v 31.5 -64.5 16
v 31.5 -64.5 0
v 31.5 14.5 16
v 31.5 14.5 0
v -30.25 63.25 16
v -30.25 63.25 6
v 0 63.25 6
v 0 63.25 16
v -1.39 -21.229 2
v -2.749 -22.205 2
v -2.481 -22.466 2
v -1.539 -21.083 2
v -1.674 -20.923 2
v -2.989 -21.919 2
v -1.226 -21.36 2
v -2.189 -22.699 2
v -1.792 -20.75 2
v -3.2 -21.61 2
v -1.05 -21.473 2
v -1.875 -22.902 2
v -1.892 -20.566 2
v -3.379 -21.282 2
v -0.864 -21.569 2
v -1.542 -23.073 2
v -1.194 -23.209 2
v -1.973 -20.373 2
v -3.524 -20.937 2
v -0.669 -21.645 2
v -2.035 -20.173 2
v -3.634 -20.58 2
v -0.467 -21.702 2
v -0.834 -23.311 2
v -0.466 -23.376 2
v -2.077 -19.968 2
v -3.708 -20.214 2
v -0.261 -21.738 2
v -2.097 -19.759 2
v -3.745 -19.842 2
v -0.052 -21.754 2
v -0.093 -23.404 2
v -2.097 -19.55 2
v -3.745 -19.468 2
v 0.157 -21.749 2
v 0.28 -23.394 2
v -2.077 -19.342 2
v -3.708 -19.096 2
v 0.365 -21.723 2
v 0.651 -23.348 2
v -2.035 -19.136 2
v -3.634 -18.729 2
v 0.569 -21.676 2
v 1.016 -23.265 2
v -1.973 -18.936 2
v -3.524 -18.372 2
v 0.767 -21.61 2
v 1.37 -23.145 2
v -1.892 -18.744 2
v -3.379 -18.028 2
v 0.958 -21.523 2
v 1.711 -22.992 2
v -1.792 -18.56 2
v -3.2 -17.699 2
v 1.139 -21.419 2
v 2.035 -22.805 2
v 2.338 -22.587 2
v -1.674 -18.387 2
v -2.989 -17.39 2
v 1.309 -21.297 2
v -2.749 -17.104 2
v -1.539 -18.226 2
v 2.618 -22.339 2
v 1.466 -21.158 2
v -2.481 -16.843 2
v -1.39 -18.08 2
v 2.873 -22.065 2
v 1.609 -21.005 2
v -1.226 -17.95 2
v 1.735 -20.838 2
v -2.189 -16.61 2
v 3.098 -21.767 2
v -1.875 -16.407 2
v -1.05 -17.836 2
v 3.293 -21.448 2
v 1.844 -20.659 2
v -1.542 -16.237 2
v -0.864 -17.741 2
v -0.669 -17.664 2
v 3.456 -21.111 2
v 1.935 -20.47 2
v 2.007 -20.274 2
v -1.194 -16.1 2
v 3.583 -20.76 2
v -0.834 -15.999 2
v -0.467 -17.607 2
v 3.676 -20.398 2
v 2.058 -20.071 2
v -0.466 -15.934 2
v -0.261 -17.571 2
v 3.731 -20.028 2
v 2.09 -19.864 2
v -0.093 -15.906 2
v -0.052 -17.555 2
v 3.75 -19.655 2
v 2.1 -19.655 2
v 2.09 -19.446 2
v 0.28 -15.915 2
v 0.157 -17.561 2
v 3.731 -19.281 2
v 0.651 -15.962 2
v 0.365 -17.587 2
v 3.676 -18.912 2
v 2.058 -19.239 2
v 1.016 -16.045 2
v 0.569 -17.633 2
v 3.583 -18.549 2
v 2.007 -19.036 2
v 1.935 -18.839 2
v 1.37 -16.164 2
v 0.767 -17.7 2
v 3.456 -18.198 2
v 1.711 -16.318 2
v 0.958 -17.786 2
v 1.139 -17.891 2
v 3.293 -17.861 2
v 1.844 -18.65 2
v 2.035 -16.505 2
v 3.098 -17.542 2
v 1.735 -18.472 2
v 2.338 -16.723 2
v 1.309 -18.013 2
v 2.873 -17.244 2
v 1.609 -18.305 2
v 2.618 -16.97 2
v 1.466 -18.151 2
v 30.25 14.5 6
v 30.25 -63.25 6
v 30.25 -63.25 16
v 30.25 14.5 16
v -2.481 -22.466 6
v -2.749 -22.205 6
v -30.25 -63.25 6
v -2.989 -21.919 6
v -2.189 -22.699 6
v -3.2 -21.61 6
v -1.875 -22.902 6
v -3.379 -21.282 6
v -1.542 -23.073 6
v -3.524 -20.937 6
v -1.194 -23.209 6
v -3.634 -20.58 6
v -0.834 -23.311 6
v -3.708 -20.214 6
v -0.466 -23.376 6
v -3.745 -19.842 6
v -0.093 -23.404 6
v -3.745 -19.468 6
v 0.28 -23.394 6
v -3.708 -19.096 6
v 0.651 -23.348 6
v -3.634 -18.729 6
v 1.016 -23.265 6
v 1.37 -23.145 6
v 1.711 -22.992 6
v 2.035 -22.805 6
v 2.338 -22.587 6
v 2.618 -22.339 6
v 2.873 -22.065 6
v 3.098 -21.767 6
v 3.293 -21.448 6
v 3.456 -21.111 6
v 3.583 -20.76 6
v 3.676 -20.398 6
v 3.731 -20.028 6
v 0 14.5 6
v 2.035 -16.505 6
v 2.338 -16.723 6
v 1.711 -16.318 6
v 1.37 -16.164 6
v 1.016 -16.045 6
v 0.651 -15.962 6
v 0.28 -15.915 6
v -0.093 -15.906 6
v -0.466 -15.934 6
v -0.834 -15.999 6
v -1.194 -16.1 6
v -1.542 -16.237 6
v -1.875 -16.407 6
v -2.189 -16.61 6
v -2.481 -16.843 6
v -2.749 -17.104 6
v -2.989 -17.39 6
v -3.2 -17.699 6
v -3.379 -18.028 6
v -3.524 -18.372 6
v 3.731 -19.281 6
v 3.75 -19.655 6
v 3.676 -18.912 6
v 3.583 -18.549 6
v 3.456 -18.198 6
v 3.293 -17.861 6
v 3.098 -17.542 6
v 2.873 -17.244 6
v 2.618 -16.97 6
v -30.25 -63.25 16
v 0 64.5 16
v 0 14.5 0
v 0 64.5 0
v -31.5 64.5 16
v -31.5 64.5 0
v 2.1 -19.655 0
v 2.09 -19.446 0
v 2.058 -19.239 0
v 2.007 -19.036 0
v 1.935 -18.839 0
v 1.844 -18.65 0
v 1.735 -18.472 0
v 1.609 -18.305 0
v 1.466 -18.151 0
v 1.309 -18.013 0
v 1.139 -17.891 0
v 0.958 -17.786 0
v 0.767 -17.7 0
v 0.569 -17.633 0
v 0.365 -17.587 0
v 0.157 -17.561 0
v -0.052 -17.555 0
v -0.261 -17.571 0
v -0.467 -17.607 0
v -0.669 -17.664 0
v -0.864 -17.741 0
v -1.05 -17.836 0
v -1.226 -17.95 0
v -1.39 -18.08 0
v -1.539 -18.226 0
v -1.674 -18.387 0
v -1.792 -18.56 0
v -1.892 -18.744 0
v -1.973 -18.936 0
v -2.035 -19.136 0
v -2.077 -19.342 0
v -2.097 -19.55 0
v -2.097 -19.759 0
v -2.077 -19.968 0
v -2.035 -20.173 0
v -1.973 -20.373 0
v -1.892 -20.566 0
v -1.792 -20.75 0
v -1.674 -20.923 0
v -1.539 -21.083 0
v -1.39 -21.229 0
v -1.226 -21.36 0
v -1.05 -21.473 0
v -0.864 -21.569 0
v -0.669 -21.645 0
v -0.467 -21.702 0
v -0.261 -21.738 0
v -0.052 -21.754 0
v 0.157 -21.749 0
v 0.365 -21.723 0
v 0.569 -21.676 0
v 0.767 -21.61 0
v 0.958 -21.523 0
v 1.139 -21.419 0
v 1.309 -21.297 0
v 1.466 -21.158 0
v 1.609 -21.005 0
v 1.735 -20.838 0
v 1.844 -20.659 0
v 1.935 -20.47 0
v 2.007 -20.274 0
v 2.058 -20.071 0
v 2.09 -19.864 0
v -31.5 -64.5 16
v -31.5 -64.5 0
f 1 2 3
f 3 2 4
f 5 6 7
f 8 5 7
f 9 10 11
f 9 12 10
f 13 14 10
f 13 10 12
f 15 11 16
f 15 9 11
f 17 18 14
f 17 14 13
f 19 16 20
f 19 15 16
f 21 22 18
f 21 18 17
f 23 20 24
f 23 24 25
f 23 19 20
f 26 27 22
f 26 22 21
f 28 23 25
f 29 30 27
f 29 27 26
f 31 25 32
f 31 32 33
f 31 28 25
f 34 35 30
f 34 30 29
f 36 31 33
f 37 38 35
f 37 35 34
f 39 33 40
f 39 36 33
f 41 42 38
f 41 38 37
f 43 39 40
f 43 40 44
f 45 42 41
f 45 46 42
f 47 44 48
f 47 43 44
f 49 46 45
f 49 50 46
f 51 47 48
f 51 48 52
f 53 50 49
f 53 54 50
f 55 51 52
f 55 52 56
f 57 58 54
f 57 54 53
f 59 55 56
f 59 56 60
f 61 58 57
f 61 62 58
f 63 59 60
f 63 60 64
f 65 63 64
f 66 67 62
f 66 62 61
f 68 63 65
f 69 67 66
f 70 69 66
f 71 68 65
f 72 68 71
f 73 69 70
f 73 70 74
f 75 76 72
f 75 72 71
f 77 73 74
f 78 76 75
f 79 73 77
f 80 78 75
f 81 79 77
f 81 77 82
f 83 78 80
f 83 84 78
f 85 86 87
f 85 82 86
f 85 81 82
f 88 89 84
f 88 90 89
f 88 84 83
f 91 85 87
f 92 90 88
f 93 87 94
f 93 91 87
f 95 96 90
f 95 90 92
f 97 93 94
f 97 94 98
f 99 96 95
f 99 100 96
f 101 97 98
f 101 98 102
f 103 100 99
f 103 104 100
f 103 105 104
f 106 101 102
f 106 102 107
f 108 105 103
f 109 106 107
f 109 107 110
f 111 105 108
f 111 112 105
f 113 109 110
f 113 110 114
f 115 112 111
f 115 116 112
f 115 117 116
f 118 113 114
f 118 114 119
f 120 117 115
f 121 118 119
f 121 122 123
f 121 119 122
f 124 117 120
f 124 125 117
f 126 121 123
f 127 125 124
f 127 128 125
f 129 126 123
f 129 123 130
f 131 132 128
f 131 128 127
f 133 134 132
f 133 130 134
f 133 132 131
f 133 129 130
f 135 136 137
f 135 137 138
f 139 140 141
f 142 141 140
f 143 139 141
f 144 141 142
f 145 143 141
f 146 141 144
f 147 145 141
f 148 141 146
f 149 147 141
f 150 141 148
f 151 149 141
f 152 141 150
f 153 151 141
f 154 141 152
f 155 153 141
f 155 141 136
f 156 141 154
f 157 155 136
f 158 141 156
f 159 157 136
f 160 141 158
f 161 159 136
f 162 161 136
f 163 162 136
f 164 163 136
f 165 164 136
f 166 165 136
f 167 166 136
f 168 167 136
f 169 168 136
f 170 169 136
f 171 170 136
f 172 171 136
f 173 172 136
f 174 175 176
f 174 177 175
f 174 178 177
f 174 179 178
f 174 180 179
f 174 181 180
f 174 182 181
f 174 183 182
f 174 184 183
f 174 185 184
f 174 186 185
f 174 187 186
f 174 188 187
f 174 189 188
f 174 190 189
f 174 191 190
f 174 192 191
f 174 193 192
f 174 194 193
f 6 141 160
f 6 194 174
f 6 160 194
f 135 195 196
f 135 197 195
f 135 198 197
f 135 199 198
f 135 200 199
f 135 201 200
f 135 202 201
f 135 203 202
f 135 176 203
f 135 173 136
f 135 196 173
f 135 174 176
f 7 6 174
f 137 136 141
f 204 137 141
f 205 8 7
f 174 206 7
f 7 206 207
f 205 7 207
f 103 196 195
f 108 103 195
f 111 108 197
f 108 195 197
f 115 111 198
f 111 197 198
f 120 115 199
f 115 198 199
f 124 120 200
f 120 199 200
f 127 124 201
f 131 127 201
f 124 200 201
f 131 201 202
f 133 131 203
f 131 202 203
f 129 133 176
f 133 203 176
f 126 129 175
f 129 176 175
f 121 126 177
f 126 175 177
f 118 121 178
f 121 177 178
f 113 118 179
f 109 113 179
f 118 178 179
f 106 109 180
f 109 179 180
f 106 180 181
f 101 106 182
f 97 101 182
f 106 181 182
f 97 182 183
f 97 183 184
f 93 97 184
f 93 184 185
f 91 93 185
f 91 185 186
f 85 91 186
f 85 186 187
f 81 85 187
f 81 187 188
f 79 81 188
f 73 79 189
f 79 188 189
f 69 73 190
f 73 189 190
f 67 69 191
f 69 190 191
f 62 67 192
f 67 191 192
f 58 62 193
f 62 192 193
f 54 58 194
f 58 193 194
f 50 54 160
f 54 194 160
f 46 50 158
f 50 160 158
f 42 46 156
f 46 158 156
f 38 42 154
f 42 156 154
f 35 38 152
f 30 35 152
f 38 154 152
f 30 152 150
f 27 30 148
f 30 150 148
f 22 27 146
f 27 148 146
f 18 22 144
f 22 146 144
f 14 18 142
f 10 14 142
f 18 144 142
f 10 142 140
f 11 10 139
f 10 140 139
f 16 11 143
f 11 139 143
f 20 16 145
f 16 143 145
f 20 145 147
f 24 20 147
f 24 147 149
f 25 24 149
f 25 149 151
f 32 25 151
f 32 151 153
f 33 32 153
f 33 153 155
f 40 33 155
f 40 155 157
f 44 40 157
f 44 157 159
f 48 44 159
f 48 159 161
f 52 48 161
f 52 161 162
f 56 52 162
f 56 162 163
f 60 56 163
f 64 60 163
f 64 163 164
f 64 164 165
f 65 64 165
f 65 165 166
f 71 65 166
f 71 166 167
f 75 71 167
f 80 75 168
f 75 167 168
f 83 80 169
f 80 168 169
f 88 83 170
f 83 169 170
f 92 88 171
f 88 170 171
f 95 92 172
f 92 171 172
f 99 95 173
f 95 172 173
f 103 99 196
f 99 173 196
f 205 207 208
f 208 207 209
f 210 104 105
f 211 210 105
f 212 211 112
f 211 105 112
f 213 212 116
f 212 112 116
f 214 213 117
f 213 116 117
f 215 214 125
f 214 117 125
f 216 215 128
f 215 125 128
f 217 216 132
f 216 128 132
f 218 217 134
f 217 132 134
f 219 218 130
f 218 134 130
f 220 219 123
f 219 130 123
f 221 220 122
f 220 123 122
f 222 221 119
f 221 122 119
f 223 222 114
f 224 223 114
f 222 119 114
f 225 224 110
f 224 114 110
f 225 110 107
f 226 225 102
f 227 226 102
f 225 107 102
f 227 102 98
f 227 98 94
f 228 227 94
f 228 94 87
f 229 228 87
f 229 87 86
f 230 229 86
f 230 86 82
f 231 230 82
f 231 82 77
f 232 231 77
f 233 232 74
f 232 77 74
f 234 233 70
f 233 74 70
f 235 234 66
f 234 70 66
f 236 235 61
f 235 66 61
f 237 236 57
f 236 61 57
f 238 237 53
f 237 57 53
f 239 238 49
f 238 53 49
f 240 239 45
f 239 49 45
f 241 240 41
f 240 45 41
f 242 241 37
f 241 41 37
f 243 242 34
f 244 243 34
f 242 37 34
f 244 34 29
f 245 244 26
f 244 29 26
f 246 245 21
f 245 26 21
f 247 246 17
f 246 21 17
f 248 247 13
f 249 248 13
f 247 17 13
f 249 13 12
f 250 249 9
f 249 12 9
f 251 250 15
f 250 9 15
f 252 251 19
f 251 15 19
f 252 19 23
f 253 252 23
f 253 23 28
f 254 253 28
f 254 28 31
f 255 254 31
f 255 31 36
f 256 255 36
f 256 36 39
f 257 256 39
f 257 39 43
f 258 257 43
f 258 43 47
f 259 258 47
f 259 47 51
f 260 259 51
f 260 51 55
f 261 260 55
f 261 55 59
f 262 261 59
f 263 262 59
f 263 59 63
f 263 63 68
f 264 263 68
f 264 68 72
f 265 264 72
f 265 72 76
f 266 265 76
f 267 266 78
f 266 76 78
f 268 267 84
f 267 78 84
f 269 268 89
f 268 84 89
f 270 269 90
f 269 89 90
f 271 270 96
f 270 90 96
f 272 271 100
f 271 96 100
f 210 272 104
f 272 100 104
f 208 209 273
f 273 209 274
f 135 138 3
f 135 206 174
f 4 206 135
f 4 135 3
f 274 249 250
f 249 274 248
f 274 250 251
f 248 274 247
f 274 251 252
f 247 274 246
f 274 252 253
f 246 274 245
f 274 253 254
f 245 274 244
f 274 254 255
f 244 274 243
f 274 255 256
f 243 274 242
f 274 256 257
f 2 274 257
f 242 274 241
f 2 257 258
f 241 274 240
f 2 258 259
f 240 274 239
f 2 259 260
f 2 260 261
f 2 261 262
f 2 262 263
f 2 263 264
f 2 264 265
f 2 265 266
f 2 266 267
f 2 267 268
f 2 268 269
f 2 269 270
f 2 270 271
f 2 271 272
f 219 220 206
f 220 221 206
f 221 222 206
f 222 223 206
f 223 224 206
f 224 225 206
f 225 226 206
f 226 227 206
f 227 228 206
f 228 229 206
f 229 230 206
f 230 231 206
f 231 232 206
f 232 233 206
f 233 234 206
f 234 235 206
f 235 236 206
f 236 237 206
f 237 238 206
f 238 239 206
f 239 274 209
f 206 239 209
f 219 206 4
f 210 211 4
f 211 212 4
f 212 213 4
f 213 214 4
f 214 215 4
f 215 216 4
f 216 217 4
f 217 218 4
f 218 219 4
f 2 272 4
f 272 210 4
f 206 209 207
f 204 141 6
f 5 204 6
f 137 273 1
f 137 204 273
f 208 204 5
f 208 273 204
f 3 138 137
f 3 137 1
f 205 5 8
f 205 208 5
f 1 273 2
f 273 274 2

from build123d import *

# Parameters (mm, degrees)
F1_DEPTH = 6
F2_W     = 1.25
F2_H     = 126.5
F2_H_2   = 1.25
F2_H_3   = 77.75
F3_DEPTH = 10
F4_R     = 3.75
F5_DEPTH = 4
F6_R     = 2.1
F7_DEPTH = 2


with BuildPart() as f1:
    # F0 (on Top) → F1 (new body)
    with BuildSketch(Plane.XY):
        Polygon((-31.5, -64.5), (31.5, -64.5), (31.5, 14.5), (0, 14.5), (0, 64.5), (-31.5, 64.5), align=None)
    extrude(amount=F1_DEPTH)

    # F2 (on face) → F3 (join)
    with BuildSketch(Plane.XY.offset(6)):
        Polygon((0, 64.5), (-31.5, 64.5), (-31.5, 63.25), (-30.25, 63.25), (-29, 63.25), (0, 63.25), align=None)
        with Locations((-30.875, 0)):
            Rectangle(F2_W, F2_H)
        with Locations((-30.875, -63.875)):
            Rectangle(F2_W, F2_H_2)
        Polygon((30.25, -63.25), (-30.25, -63.25), (-30.25, -64.5), (31.5, -64.5), (31.5, -63.25), align=None)
        with Locations((30.875, -24.375)):
            Rectangle(F2_W, F2_H_3)
    extrude(amount=F3_DEPTH)

    # F4 (on face) → F5 (cut)
    with BuildSketch(Plane.XY.offset(6)):
        with Locations((0, -19.654689)):
            Circle(F4_R)
    extrude(amount=-F5_DEPTH, mode=Mode.SUBTRACT)

    # F6 (on face) → F7 (cut, through all)
    with BuildSketch(Plane.XY.offset(2)):
        with Locations((0, -19.654689)):
            Circle(F6_R)
    extrude(amount=-F7_DEPTH, mode=Mode.SUBTRACT)


solid = f1.part
